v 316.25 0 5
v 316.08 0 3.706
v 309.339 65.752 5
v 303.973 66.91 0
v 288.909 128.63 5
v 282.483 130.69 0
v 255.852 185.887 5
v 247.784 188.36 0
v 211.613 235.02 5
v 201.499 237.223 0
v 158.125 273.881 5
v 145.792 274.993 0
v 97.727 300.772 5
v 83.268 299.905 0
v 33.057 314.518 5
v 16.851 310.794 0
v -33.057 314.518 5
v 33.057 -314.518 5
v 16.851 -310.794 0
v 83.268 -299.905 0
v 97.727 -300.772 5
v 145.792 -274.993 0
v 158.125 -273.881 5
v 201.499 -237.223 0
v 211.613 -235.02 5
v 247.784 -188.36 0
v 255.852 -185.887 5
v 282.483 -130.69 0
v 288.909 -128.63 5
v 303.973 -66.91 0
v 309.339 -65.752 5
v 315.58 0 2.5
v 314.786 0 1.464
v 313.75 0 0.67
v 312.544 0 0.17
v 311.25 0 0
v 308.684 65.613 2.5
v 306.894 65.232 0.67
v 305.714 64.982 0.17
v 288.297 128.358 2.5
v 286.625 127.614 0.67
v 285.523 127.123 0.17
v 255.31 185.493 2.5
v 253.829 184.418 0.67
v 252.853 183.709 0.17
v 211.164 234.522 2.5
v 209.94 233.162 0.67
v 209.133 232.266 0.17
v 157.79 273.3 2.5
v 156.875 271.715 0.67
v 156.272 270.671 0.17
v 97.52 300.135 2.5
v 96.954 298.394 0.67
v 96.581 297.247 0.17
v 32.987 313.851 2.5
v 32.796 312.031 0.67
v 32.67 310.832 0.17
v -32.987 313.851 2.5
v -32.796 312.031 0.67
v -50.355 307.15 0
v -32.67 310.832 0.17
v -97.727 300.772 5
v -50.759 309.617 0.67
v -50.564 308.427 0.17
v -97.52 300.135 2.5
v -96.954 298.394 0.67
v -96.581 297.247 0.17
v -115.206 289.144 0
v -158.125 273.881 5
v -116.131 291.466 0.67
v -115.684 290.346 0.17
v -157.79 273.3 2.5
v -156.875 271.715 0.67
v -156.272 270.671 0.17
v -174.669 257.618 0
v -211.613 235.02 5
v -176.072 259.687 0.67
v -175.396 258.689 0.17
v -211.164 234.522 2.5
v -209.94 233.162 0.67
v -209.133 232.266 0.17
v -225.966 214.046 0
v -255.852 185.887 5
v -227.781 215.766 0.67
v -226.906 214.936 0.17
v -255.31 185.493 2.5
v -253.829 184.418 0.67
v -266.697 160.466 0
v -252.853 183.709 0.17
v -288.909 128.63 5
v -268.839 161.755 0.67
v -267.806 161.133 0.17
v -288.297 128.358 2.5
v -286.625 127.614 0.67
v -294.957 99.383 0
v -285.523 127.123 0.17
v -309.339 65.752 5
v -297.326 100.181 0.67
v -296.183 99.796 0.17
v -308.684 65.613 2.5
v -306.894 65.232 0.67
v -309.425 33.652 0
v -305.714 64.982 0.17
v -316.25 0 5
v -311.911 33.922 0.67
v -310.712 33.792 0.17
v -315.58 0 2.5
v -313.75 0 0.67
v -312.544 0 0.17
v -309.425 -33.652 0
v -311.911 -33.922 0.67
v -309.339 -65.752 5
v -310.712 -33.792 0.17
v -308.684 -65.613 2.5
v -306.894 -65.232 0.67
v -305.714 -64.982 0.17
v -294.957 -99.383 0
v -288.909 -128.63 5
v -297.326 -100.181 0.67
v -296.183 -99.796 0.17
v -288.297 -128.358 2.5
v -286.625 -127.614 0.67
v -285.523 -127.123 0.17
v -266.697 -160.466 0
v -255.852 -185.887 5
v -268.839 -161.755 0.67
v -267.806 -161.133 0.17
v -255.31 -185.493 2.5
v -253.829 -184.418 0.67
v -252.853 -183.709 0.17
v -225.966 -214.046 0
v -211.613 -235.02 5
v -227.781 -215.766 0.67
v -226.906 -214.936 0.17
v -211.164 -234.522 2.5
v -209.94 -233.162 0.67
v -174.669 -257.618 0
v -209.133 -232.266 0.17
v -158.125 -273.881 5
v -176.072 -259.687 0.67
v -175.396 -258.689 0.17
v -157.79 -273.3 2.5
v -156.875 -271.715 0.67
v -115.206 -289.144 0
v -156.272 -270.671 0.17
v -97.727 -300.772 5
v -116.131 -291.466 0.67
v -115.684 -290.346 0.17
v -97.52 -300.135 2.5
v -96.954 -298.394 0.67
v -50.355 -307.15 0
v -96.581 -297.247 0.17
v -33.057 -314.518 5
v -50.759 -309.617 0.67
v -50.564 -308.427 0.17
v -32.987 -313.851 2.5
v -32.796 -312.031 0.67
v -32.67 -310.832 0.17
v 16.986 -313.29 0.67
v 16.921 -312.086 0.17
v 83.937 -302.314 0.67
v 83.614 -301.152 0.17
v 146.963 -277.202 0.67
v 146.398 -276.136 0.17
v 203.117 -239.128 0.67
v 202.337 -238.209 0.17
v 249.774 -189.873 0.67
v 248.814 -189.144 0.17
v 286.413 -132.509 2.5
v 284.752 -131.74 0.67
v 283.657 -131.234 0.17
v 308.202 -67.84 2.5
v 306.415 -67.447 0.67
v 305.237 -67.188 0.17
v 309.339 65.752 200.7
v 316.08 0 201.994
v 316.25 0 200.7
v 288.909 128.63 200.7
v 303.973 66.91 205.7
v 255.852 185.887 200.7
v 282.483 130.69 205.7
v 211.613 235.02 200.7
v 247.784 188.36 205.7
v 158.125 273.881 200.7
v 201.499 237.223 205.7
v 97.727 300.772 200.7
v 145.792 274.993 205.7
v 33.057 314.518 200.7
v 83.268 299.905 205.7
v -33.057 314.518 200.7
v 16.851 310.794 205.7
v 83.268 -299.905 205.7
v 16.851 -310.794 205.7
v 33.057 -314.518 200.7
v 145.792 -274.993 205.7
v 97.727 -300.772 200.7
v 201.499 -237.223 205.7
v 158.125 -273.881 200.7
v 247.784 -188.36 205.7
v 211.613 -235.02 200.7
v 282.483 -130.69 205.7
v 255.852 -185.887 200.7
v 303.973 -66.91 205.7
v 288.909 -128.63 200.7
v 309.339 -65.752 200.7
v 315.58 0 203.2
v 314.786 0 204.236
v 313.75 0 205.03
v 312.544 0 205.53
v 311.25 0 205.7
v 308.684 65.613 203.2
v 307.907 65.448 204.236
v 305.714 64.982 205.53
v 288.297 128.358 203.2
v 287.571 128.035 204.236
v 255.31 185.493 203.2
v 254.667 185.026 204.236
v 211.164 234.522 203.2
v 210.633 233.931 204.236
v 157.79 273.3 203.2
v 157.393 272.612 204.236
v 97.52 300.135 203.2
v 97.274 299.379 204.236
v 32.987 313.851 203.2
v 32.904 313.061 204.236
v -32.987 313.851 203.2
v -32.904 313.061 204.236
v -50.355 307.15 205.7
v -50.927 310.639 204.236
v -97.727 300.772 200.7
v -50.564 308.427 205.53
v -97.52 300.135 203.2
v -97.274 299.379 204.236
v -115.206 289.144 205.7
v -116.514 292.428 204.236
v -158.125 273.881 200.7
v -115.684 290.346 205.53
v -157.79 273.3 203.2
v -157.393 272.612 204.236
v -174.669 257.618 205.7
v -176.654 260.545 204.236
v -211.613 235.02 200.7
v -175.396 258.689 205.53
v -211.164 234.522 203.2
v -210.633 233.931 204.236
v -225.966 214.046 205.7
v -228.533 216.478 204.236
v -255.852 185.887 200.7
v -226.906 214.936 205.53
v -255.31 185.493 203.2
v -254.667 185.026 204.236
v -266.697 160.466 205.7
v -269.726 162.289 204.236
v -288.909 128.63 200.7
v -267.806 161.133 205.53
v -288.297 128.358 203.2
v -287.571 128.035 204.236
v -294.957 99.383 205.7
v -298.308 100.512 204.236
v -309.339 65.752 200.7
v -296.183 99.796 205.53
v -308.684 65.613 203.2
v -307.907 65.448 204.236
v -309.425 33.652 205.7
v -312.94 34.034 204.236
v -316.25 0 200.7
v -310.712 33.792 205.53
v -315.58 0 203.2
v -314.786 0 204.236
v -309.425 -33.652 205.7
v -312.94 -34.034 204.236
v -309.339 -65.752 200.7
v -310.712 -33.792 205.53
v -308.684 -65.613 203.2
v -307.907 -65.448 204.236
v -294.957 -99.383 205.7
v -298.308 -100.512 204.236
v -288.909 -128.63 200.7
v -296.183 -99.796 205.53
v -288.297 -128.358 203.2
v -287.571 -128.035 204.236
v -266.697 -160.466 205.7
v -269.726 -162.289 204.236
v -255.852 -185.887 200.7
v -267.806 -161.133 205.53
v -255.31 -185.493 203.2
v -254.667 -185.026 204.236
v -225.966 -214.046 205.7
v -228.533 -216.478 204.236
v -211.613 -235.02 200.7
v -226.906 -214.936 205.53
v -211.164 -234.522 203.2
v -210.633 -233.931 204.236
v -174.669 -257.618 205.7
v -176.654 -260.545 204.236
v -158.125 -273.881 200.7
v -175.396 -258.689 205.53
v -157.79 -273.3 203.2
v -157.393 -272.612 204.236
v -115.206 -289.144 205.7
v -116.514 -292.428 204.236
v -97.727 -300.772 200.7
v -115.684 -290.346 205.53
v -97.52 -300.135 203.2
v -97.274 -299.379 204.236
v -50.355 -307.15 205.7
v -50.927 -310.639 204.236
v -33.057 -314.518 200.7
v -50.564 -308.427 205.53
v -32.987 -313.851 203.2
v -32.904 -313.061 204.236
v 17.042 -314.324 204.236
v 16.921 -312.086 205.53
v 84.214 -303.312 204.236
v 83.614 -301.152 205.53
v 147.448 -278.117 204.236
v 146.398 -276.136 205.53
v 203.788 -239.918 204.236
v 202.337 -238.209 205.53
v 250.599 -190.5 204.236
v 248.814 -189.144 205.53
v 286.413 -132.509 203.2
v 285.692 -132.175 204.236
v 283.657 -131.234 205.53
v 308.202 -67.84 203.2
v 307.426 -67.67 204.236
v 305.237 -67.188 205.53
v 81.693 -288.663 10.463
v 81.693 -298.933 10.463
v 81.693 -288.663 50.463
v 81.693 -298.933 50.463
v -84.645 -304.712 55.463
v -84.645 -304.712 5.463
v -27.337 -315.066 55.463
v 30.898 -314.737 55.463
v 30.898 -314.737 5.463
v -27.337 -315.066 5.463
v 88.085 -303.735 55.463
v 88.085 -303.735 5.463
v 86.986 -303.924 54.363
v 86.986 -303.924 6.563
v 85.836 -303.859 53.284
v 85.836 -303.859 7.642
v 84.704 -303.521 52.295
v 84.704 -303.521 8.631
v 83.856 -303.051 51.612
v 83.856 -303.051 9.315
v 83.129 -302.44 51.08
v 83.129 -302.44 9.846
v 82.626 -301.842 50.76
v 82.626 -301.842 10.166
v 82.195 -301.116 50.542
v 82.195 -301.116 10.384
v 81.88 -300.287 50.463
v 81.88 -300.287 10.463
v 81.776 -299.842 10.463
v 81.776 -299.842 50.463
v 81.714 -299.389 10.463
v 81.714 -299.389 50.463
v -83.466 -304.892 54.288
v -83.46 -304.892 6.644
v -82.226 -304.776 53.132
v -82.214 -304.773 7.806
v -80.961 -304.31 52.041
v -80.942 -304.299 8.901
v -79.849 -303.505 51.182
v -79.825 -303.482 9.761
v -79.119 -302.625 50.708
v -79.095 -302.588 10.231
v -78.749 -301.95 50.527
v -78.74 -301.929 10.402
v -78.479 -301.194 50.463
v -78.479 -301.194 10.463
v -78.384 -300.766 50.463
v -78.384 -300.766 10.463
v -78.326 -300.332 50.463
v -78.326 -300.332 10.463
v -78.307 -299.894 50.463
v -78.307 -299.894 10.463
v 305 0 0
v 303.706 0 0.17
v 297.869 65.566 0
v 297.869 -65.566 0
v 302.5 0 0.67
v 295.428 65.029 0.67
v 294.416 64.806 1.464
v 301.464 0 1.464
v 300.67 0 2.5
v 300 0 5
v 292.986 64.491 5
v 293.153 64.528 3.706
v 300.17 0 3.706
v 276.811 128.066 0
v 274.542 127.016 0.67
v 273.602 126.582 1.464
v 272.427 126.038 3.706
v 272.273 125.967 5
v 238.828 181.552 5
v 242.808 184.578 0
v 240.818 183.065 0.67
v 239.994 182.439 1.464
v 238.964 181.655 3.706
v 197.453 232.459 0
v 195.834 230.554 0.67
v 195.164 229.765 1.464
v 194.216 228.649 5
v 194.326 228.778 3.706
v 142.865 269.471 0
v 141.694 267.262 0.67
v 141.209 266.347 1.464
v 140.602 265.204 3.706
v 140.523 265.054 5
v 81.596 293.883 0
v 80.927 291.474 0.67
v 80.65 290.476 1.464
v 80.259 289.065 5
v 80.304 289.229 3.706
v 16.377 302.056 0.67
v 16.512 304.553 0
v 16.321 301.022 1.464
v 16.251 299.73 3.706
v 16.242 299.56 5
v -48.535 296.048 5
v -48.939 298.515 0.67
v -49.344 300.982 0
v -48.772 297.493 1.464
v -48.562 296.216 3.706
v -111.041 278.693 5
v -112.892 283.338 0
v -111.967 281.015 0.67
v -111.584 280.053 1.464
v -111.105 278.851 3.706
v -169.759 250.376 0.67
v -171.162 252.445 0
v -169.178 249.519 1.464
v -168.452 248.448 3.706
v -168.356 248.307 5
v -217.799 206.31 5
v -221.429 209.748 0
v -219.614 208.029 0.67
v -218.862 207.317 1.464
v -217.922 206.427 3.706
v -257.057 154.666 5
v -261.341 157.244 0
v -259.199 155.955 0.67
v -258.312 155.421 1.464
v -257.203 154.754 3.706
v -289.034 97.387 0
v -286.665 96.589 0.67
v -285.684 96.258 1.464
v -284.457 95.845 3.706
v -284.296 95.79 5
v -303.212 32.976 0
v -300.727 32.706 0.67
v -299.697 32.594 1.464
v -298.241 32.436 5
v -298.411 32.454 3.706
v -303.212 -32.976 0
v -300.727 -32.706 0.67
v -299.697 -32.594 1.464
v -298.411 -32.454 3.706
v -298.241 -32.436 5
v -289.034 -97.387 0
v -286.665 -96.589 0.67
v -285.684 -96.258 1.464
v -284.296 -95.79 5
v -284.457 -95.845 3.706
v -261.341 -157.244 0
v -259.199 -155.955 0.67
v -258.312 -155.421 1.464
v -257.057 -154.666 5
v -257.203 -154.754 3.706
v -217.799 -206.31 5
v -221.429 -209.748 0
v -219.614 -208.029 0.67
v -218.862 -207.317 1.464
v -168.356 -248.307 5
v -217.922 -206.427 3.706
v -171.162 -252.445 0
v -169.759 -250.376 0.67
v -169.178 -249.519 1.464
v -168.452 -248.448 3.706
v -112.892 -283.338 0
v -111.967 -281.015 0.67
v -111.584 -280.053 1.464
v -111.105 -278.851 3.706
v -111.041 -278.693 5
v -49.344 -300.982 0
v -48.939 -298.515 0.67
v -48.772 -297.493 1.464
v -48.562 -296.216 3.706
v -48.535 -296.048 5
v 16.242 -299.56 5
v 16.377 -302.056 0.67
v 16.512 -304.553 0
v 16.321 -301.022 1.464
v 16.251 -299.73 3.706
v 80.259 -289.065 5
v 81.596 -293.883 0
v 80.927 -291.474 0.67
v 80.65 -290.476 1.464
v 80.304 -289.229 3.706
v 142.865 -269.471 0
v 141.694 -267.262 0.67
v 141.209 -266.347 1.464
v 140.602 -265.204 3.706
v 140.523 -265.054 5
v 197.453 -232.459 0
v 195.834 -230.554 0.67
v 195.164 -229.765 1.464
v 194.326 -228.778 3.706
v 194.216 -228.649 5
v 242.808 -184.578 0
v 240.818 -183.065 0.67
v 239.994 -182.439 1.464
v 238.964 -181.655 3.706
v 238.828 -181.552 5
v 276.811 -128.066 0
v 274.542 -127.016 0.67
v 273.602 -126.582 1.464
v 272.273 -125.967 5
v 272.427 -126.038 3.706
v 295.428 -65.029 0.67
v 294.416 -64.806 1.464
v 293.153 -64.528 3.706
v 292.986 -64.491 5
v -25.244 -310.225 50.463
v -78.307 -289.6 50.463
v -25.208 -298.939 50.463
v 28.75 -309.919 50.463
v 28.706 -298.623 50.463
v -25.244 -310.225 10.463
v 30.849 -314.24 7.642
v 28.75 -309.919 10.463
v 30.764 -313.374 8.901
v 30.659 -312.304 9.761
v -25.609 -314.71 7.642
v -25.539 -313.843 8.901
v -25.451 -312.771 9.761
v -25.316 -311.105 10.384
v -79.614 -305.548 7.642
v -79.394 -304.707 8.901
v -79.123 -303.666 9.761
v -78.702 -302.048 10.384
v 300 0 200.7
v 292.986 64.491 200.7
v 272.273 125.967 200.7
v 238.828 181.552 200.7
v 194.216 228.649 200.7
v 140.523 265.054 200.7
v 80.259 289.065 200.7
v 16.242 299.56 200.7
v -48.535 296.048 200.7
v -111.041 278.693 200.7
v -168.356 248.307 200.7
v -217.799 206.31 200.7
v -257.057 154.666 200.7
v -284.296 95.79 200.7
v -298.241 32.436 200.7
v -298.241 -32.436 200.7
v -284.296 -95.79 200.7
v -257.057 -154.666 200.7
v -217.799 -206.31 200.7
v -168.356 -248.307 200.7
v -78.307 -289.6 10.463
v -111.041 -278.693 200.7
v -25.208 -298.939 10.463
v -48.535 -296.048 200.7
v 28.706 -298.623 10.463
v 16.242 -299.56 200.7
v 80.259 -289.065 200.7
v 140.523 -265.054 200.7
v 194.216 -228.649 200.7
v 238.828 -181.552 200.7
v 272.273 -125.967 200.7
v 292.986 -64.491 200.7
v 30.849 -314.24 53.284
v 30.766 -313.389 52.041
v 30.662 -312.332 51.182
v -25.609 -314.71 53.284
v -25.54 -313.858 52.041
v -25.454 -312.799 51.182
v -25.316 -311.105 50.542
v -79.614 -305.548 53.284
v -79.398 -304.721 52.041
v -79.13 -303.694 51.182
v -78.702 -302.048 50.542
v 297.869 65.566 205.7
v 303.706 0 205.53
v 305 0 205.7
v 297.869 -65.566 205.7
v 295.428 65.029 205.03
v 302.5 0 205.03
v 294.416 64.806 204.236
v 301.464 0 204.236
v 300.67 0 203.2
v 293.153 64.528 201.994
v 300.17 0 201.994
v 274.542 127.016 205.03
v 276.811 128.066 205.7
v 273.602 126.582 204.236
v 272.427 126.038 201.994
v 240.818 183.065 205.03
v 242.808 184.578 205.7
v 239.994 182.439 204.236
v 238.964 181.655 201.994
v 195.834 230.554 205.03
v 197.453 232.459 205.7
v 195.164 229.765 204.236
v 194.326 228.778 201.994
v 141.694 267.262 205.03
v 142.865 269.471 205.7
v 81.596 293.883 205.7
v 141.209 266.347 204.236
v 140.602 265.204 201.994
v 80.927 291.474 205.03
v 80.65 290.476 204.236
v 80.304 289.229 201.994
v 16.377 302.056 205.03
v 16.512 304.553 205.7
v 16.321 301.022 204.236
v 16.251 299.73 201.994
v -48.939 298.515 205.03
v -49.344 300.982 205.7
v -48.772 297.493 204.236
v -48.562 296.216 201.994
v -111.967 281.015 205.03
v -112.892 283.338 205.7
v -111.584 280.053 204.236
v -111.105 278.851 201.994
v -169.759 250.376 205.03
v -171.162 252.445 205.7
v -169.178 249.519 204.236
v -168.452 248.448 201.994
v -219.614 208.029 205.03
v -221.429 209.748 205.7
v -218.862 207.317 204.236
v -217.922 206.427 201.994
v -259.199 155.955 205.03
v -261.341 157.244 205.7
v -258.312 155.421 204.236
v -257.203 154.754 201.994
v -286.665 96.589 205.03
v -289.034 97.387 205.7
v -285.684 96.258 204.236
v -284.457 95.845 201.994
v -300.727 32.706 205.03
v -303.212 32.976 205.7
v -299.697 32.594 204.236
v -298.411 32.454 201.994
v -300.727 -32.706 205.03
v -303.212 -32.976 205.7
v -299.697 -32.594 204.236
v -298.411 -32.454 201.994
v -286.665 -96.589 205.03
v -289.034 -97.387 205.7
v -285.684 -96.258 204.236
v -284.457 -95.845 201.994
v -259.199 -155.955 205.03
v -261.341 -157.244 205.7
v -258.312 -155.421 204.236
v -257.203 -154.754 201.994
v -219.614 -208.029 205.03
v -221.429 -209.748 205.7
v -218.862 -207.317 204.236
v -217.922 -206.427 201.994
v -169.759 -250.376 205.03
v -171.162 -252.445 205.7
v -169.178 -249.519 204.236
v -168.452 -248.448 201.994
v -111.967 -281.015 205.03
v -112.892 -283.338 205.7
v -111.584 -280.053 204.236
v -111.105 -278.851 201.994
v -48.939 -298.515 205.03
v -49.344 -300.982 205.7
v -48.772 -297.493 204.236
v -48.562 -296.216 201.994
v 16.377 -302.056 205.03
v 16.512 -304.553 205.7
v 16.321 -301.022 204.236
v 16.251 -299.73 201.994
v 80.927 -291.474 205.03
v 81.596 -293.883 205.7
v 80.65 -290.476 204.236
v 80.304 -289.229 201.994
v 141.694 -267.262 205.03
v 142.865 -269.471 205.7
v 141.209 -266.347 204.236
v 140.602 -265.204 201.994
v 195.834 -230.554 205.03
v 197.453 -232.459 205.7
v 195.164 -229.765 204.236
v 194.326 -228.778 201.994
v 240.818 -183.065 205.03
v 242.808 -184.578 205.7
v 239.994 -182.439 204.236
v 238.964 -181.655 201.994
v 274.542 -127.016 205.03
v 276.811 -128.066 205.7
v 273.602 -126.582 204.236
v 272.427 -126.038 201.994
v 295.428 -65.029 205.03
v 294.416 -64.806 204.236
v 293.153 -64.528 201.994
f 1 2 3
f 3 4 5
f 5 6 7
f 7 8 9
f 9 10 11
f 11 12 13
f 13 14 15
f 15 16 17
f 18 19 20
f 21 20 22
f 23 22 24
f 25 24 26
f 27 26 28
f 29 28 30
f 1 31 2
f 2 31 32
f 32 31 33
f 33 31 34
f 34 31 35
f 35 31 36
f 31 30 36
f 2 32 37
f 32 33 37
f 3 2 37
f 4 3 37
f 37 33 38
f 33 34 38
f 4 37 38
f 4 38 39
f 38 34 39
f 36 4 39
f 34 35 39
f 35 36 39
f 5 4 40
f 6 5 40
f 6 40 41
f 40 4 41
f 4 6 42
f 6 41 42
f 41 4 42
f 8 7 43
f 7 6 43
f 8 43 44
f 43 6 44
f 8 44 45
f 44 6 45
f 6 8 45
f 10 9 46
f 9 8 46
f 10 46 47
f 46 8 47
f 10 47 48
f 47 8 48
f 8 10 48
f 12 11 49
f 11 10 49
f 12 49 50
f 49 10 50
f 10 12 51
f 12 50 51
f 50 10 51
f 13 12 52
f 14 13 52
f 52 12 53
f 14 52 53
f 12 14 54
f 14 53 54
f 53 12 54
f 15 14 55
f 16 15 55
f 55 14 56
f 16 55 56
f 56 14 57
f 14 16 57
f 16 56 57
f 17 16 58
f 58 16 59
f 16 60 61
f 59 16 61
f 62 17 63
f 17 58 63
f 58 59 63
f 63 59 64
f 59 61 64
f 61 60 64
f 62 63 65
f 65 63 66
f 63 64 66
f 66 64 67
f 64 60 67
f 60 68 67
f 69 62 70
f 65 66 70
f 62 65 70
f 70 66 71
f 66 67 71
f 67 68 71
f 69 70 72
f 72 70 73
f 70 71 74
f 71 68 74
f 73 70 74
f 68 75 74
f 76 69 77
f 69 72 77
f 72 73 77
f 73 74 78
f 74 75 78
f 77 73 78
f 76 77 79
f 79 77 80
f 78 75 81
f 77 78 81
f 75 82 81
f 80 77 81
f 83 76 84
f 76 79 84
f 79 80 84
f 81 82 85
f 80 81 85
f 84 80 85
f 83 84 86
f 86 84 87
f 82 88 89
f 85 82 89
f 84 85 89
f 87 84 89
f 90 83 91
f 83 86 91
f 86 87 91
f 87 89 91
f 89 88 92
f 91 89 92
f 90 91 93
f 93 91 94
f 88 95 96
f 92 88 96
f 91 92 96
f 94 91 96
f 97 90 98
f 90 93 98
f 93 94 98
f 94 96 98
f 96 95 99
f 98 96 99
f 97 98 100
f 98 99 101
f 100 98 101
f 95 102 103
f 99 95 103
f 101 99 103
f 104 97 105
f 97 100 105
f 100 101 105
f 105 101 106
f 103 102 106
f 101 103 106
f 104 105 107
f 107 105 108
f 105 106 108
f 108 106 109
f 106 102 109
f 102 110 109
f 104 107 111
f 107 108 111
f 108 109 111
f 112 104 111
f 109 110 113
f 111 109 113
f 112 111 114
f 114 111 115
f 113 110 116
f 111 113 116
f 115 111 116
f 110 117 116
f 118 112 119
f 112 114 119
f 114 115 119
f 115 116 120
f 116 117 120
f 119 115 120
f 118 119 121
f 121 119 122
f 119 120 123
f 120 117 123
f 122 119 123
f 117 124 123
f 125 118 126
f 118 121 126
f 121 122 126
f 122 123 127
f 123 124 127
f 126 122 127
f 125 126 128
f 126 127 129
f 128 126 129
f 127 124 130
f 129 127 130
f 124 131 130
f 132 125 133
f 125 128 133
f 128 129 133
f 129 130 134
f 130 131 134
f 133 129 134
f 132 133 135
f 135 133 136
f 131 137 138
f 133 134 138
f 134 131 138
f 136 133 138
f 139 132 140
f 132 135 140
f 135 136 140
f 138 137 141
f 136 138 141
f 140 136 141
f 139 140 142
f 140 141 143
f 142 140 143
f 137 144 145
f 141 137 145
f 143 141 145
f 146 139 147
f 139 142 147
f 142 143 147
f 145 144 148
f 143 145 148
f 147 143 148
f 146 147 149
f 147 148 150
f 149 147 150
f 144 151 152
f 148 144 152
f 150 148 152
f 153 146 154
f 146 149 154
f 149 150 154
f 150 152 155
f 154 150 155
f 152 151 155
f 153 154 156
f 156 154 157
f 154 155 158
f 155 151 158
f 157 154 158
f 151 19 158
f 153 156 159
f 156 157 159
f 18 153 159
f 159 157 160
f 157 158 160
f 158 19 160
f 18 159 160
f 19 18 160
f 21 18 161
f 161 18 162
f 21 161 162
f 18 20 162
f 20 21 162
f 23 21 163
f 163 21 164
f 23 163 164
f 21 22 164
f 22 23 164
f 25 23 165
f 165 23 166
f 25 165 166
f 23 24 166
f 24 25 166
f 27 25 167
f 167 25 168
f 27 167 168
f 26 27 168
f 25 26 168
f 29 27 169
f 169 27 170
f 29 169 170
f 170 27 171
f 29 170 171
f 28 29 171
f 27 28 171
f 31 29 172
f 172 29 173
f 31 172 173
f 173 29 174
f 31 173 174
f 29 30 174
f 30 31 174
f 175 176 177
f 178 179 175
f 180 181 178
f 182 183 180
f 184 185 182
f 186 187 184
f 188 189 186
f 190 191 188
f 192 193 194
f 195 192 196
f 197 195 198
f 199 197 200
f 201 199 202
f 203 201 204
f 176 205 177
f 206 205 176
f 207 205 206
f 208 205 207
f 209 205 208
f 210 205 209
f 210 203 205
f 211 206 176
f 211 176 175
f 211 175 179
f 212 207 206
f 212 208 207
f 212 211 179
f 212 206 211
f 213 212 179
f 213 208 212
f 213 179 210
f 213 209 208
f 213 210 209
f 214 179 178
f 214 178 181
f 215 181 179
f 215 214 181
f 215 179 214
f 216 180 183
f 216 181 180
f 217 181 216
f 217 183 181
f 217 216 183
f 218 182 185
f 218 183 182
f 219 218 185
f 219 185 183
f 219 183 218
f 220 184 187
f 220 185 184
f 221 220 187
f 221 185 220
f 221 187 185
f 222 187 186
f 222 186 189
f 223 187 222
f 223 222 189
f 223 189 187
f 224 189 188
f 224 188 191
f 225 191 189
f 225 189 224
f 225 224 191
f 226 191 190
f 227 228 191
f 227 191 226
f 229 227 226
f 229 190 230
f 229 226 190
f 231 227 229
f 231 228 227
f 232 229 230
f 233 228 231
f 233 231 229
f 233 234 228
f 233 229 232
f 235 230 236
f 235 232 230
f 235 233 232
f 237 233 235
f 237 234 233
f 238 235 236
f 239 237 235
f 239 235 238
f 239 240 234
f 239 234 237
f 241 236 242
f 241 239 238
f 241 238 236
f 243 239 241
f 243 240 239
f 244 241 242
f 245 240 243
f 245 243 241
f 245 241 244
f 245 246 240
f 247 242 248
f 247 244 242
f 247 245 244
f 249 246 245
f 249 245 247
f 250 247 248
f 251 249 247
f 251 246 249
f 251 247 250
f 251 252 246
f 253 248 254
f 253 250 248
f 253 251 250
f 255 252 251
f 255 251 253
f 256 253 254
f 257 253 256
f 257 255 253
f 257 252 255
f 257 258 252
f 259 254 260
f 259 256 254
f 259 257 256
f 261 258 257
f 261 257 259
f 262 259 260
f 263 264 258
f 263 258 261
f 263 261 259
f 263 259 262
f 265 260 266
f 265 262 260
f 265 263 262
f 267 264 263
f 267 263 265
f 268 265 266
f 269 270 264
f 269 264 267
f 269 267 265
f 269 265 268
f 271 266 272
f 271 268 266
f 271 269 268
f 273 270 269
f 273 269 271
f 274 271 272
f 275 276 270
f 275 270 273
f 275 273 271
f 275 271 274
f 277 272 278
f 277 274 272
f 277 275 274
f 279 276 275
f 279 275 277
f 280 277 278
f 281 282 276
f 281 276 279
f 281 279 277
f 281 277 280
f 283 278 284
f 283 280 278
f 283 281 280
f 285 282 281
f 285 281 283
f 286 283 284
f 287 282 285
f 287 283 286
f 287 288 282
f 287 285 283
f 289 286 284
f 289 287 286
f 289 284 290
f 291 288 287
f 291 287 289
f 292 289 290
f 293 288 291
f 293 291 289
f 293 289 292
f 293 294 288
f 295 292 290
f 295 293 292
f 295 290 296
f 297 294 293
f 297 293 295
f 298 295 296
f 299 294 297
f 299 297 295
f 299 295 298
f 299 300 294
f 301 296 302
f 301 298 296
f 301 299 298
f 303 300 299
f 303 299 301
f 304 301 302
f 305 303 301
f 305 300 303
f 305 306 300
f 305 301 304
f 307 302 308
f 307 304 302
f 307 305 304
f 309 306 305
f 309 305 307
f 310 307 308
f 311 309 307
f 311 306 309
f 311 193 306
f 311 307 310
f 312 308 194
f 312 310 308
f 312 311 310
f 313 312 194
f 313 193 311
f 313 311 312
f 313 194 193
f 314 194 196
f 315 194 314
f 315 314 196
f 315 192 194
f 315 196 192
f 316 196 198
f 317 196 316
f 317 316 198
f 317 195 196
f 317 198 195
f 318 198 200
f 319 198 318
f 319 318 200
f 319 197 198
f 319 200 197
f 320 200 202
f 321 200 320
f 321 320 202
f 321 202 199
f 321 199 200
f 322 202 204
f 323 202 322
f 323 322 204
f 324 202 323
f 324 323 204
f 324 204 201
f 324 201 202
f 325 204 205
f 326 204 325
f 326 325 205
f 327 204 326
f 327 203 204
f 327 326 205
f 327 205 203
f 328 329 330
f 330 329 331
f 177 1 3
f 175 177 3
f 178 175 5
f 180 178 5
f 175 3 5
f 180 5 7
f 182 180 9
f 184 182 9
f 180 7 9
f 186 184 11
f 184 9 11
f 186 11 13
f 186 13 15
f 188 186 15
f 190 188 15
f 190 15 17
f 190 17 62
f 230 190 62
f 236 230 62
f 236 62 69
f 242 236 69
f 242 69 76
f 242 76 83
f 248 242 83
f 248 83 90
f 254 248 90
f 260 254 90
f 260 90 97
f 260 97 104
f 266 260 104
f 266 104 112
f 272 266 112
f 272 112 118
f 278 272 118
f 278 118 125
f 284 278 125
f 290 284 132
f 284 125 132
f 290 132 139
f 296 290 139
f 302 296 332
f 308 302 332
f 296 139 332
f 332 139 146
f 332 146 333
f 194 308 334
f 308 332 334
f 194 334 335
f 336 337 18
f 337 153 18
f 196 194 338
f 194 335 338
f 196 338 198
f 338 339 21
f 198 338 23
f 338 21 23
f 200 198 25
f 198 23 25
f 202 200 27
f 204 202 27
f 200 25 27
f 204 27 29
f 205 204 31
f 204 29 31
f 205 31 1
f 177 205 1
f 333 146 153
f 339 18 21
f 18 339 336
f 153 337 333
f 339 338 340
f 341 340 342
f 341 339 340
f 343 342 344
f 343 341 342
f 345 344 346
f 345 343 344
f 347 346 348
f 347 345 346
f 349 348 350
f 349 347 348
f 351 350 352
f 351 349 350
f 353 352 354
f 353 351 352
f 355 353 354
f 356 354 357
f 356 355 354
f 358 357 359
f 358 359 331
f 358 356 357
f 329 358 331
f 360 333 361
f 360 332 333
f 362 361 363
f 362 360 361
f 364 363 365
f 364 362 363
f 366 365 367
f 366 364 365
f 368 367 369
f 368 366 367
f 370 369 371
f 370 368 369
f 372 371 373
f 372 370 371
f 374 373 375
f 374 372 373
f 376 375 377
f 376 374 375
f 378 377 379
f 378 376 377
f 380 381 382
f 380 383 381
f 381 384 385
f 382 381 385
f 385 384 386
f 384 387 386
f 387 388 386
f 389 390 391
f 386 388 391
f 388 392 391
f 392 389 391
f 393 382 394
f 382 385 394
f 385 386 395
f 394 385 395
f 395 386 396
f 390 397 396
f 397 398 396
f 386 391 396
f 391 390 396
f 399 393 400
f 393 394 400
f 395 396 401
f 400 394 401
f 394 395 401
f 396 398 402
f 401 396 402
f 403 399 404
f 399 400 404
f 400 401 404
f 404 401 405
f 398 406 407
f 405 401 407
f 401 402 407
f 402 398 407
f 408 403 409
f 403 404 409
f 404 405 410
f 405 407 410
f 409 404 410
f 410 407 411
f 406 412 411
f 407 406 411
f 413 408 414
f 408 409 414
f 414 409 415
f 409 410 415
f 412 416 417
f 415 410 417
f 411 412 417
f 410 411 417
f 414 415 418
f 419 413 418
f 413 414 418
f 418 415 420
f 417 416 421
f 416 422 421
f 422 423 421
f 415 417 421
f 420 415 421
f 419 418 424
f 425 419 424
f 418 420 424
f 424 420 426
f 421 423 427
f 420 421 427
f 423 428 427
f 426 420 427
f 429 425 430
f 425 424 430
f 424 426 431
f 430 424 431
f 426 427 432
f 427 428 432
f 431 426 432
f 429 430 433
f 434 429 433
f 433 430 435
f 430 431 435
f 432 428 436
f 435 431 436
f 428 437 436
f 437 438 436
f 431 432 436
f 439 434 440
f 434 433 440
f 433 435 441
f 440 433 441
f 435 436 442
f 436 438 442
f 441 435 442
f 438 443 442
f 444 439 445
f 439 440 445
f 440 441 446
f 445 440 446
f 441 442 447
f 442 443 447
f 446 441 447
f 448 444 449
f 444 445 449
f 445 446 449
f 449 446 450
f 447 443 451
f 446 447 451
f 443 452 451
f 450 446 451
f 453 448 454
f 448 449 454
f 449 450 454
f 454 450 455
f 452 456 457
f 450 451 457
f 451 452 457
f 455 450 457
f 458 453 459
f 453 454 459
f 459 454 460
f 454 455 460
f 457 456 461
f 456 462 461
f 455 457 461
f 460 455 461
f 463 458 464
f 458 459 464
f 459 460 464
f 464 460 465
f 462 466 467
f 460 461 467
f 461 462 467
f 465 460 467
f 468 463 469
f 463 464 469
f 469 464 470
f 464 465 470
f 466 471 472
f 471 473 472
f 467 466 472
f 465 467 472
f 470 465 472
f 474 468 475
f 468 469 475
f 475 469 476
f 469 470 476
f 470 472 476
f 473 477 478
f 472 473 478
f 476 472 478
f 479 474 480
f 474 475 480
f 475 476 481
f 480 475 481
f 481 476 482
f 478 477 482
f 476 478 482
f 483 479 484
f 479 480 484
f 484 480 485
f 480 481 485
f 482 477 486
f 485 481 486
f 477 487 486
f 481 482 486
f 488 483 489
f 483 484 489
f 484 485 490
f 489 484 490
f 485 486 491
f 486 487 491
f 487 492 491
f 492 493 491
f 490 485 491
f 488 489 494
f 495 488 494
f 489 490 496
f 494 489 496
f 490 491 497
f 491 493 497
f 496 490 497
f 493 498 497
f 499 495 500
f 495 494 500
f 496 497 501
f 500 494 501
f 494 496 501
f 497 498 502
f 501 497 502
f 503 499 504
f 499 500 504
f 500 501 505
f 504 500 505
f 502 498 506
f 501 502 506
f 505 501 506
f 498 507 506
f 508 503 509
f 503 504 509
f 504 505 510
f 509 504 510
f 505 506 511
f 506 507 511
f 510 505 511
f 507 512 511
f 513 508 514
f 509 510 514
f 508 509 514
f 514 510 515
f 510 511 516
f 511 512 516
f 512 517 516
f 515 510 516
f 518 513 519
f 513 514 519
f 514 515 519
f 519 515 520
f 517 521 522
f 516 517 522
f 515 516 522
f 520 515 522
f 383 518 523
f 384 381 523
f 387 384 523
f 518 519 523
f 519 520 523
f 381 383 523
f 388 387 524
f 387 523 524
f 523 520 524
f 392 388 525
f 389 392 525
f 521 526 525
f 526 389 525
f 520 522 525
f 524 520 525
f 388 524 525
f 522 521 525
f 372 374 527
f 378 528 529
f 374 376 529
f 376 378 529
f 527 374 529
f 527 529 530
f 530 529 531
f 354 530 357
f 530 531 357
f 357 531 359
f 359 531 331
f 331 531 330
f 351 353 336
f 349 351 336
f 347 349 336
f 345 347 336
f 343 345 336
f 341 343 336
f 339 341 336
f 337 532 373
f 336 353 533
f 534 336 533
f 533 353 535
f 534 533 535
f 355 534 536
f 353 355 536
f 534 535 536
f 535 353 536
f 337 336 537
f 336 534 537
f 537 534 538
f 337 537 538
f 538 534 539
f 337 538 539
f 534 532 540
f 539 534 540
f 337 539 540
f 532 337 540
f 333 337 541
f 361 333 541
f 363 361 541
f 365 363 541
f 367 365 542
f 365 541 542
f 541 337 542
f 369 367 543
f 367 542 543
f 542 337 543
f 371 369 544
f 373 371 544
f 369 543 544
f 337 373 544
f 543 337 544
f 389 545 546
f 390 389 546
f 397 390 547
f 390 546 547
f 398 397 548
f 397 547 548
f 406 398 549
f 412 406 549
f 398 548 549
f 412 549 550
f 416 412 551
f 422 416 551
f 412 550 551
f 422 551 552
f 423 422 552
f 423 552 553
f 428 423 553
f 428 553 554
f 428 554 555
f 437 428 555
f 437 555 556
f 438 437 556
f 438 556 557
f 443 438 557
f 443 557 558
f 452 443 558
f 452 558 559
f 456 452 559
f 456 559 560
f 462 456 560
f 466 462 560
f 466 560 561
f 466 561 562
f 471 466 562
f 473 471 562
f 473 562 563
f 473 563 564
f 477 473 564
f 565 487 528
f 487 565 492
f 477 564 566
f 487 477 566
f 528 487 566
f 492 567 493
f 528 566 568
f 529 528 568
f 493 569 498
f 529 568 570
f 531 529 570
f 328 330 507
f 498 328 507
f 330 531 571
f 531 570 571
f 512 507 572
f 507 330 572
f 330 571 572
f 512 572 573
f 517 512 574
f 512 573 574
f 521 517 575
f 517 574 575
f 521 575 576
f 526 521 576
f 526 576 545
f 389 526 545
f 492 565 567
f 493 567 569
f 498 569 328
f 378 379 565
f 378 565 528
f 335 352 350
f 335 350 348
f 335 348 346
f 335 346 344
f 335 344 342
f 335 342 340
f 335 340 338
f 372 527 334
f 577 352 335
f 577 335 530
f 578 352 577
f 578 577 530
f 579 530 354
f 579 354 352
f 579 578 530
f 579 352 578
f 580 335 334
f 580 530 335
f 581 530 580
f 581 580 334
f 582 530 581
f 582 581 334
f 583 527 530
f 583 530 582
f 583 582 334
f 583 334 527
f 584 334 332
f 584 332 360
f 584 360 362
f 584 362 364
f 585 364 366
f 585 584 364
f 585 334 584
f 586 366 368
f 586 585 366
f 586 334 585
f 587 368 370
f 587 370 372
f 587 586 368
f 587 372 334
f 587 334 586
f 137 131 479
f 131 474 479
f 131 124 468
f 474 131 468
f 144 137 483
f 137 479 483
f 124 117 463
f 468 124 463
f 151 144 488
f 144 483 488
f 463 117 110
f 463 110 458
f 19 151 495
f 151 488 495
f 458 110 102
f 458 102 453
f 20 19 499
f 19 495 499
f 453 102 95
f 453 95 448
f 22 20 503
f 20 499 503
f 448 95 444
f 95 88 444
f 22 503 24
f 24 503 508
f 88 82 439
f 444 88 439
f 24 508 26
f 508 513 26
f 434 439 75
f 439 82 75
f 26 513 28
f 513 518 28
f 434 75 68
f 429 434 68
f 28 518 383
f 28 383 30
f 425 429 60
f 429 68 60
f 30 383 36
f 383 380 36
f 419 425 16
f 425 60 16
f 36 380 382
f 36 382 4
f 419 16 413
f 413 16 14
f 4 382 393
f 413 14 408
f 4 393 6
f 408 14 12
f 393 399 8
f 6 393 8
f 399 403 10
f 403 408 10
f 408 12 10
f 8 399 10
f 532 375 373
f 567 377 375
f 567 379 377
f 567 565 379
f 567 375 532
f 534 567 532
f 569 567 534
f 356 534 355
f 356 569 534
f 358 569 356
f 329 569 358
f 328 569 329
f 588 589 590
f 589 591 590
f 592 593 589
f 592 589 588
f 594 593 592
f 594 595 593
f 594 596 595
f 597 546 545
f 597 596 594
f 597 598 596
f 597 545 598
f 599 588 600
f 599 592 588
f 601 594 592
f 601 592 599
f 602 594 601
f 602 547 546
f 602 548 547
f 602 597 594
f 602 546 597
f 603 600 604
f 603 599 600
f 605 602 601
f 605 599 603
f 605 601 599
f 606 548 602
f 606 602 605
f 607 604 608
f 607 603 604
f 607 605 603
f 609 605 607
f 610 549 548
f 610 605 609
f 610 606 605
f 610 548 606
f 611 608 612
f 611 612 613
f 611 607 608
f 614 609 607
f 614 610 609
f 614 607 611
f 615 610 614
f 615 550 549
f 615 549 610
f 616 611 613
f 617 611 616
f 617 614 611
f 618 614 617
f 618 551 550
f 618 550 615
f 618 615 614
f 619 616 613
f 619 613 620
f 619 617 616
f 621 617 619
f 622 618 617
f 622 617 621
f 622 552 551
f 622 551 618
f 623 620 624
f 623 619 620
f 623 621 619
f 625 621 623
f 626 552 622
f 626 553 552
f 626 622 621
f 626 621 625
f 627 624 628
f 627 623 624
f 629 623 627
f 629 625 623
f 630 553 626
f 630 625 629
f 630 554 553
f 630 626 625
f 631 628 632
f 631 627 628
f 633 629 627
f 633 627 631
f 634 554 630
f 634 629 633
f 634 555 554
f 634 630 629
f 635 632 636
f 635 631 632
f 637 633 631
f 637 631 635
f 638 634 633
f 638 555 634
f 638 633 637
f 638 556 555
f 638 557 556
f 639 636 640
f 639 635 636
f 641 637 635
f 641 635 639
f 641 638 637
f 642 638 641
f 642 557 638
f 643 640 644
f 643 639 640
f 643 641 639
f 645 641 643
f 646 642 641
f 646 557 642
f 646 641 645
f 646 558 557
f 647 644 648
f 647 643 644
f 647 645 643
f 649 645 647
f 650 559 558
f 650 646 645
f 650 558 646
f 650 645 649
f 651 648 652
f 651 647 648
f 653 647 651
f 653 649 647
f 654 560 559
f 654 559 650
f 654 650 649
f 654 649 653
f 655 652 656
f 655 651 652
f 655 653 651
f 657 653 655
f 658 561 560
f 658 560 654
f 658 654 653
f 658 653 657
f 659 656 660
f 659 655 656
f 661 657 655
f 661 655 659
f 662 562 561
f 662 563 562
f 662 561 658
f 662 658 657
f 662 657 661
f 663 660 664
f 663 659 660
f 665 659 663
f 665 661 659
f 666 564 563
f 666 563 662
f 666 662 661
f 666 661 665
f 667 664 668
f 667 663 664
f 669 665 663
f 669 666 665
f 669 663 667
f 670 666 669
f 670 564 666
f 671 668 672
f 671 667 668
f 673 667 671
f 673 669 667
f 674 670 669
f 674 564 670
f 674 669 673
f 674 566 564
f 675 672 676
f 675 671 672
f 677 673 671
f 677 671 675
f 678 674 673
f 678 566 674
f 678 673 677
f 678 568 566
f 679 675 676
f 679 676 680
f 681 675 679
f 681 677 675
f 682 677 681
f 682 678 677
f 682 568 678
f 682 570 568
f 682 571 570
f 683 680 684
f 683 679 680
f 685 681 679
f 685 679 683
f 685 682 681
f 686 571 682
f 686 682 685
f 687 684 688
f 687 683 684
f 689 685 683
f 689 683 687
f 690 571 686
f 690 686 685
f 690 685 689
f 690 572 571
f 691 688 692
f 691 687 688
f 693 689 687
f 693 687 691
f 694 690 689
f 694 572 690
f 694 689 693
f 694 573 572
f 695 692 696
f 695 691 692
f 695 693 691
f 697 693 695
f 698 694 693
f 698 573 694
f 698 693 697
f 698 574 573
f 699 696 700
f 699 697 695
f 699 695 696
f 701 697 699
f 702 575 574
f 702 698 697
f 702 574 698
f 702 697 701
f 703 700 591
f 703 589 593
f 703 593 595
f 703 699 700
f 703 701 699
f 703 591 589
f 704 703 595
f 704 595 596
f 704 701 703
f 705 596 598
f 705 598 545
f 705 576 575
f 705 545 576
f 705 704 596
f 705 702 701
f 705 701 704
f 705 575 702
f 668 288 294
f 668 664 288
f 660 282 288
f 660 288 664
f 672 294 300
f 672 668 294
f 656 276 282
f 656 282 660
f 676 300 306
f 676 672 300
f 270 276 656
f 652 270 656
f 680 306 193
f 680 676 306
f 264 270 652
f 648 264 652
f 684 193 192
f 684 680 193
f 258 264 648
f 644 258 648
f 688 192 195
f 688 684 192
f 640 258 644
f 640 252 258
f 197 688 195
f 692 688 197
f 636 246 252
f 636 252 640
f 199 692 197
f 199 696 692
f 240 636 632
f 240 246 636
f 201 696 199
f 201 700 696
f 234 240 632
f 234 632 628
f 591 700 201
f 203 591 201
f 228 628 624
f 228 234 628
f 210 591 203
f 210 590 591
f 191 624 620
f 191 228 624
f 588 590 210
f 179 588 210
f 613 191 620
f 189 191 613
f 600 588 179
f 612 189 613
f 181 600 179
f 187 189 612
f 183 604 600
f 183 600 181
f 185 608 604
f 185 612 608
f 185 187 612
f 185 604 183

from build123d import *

# Parameters (mm, degrees)
F0_R         = 316.25
F1_DEPTH     = 205.7
F2_R         = 300
F3_DEPTH     = 631
F5_W         = 160
F5_H         = 40
F6_DEPTH     = 796.1248755455
F7_T1_DEPTH  = 40
F7_T10_ANGLE = 33.8359646931
F7_T16_ANGLE = 33.8359646931
F7_T27_ANGLE = 33.8359646931
F7_T31_DEPTH = 56.5905669687
F7_T38_DEPTH = 56.399324286
F7_T42_ANGLE = 33.8359646931
F7_T49_ANGLE = 33.8359646931
F7_T53_DEPTH = 56.5905669687
F7_T60_ANGLE = 33.8359646931
F7_T64_DEPTH = 56.399324286


# Not quite as in the source:
# - a fillet or chamfer that OpenCascade refuses, or shapes differently, is made with other operations: its cross-section is extruded or revolved along the edge and cut away or added


with BuildPart() as f1:
    # F0 (on Top) → F1 (new body)
    with BuildSketch(Plane.XY):
        Circle(F0_R)
    extrude(amount=F1_DEPTH)

    # F2 (on face) → F3 (cut)
    with BuildSketch(Plane.XY.offset(205.7)):
        Circle(F2_R)
    extrude(amount=-F3_DEPTH, mode=Mode.SUBTRACT)

    # F5 (on offset) → F6 (cut)
    with BuildSketch(Plane.XZ.offset(645.5422639847)):
        with Locations((1.6928017139, 30.4630875368)):
            Rectangle(F5_W, F5_H)
    extrude(amount=-F6_DEPTH, mode=Mode.SUBTRACT)

    # F7: fillet of radius 5 on 8 edges, made by hand

    # F7_s2 → F7_t1 (cut)
    with BuildSketch(Plane.XY.offset(10.4630875368)):
        with BuildLine():
            ThreePointArc((88.0854571632, -303.7351061968), (83.6897430437, -302.9306742994), (81.6928017139, -298.9329701304))
            Line((81.6928017139, -298.9329701304), (81.6928017139, -305.5165276186))
            ThreePointArc((81.6928017139, -305.5165276186), (84.8938022614, -304.6425853974), (88.0854571632, -303.7351061968))
        make_face()
        with BuildLine():
            ThreePointArc((-84.6454665316, -304.7116792899), (-80.2815860528, -303.8747654151), (-78.3071982861, -299.8941033327))
            Line((-78.3071982861, -299.8941033327), (-78.3071982861, -306.401770877))
            ThreePointArc((-78.3071982861, -306.401770877), (-81.4807145599, -305.5731592513), (-84.6454665316, -304.7116792899))
        make_face()
    extrude(amount=F7_T1_DEPTH, mode=Mode.SUBTRACT)

    # F7_s3 → F7_t4 (revolve, cut)
    with BuildSketch(Plane.XZ):
        with BuildLine():
            ThreePointArc((316.25, 200.7), (314.7855339059, 204.2355339059), (311.25, 205.7))
            Line((311.25, 205.7), (316.25, 205.7))
            Line((316.25, 205.7), (316.25, 200.7))
        make_face()
    revolve(axis=Axis((0, 0, 205.7), (0, 0, 1)), mode=Mode.SUBTRACT)

    # F7_s5 → F7_t6 (revolve, cut)
    with BuildSketch(Plane.XZ):
        with BuildLine():
            ThreePointArc((305, 205.7), (301.4644660941, 204.2355339059), (300, 200.7))
            Line((300, 200.7), (300, 205.7))
            Line((300, 205.7), (305, 205.7))
        make_face()
    revolve(axis=Axis((0, 0, 205.7), (0, 0, 1)), mode=Mode.SUBTRACT)


with BuildPart() as f7_tool8:
    # F7_s9 → F7_t10 (revolve)
    with BuildSketch(Plane(origin=(0, 0, 0), x_dir=(0, 0, 1), z_dir=(0.9550976314, 0.2962912662, 0))):
        with BuildLine():
            ThreePointArc((55.4630875368, 316.25), (51.9275536309, 314.7855339059), (50.4630875368, 311.25))
            Line((50.4630875368, 311.25), (50.4630875368, 316.25))
            Line((50.4630875368, 316.25), (55.4630875368, 316.25))
        make_face()
    revolve(axis=Axis((0, 0, 50.4630875368), (0, 0, -1)), revolution_arc=F7_T10_ANGLE)

    split(bisect_by=Plane.YZ.offset(-78.3071982861), keep=Keep.TOP)

    split(bisect_by=Plane.YZ.offset(81.6928017139), keep=Keep.BOTTOM)


with BuildPart() as f1_1:
    add(f1.part)

    # F7_t7: cut F7_tool8
    add(f7_tool8.part, mode=Mode.SUBTRACT)


with BuildPart() as f7_tool14:
    # F7_s15 → F7_t16 (revolve)
    with BuildSketch(Plane(origin=(0, 0, 0), x_dir=(0, 0, 1), z_dir=(0.9550976314, 0.2962912662, 0))):
        with BuildLine():
            ThreePointArc((5.4630875368, 316.25), (8.9986214427, 314.7855339059), (10.4630875368, 311.25))
            Line((10.4630875368, 311.25), (10.4630875368, 316.25))
            Line((10.4630875368, 316.25), (5.4630875368, 316.25))
        make_face()
    revolve(axis=Axis((0, 0, 10.4630875368), (0, 0, -1)), revolution_arc=F7_T16_ANGLE)

    split(bisect_by=Plane.YZ.offset(81.6928017139), keep=Keep.BOTTOM)

    split(bisect_by=Plane.YZ.offset(-78.3071982861), keep=Keep.TOP)


with BuildPart() as f1_2:
    add(f1_1.part)

    # F7_t13: cut F7_tool14
    add(f7_tool14.part, mode=Mode.SUBTRACT)

    # F7_s19 → F7_t20 (revolve, cut)
    with BuildSketch(Plane.XZ):
        with BuildLine():
            ThreePointArc((316.25, 5), (314.7855339059, 1.4644660941), (311.25, 0))
            Line((311.25, 0), (316.25, 0))
            Line((316.25, 0), (316.25, 5))
        make_face()
    revolve(axis=Axis((0, 0, 0), (0, 0, 1)), mode=Mode.SUBTRACT)

    # F7_s21 → F7_t22 (revolve, cut)
    with BuildSketch(Plane.XZ):
        with BuildLine():
            ThreePointArc((305, 0), (301.4644660941, 1.4644660941), (300, 5))
            Line((300, 5), (300, 0))
            Line((300, 0), (305, 0))
        make_face()
    revolve(axis=Axis((0, 0, 0), (0, 0, 1)), mode=Mode.SUBTRACT)


with BuildPart() as f7_tool25:
    # F7_s26 → F7_t27 (revolve)
    with BuildSketch(Plane(origin=(0, 0, 0), x_dir=(0, 0, 1), z_dir=(0.9550976314, 0.2962912662, 0))):
        with BuildLine():
            ThreePointArc((55.4630875368, 316.25), (51.9275536309, 314.7855339059), (50.4630875368, 311.25))
            Line((50.4630875368, 311.25), (50.4630875368, 316.25))
            Line((50.4630875368, 316.25), (55.4630875368, 316.25))
        make_face()
    revolve(axis=Axis((0, 0, 50.4630875368), (0, 0, -1)), revolution_arc=F7_T27_ANGLE)

    split(bisect_by=Plane.YZ.offset(81.6928017139), keep=Keep.TOP)


with BuildPart() as f7_tool29:
    # F7_s30 → F7_t31 (new body)
    with BuildSketch(Plane.XY.offset(67.0536545055)):
        with BuildLine():
            ThreePointArc((88.0854571632, -303.7351061968), (83.6897430437, -302.9306742994), (81.6928017139, -298.9329701304))
            Line((81.6928017139, -298.9329701304), (81.6928017139, -305.5165276186))
            ThreePointArc((81.6928017139, -305.5165276186), (84.8938022614, -304.6425853974), (88.0854571632, -303.7351061968))
        make_face()
    extrude(amount=-F7_T31_DEPTH)

    split(bisect_by=Plane.XY.offset(50.4630875368), keep=Keep.TOP)


with BuildPart() as f7_tool25_1:
    add(f7_tool25.part)

    # F7_t33: intersect F7_tool29
    add(f7_tool29.part, mode=Mode.INTERSECT)


with BuildPart() as f1_3:
    add(f1_2.part)

    # F7_t23: cut F7_tool25
    add(f7_tool25_1.part, mode=Mode.SUBTRACT)


with BuildPart() as f7_tool36:
    # F7_s37 → F7_t38 (new body)
    with BuildSketch(Plane.XY.offset(66.8624118228)):
        with BuildLine():
            ThreePointArc((-84.6454665316, -304.7116792899), (-80.2815860528, -303.8747654151), (-78.3071982861, -299.8941033327))
            Line((-78.3071982861, -299.8941033327), (-78.3071982861, -306.401770877))
            ThreePointArc((-78.3071982861, -306.401770877), (-81.4807145599, -305.5731592513), (-84.6454665316, -304.7116792899))
        make_face()
    extrude(amount=-F7_T38_DEPTH)

    split(bisect_by=Plane.XY.offset(50.4630875368), keep=Keep.TOP)


with BuildPart() as f7_tool40:
    # F7_s41 → F7_t42 (revolve)
    with BuildSketch(Plane(origin=(0, 0, 0), x_dir=(0, 0, 1), z_dir=(0.9550976314, 0.2962912662, 0))):
        with BuildLine():
            ThreePointArc((55.4630875368, 316.25), (51.9275536309, 314.7855339059), (50.4630875368, 311.25))
            Line((50.4630875368, 311.25), (50.4630875368, 316.25))
            Line((50.4630875368, 316.25), (55.4630875368, 316.25))
        make_face()
    revolve(axis=Axis((0, 0, 50.4630875368), (0, 0, -1)), revolution_arc=F7_T42_ANGLE)

    split(bisect_by=Plane.YZ.offset(-78.3071982861), keep=Keep.BOTTOM)


with BuildPart() as f7_tool36_1:
    add(f7_tool36.part)

    # F7_t44: intersect F7_tool40
    add(f7_tool40.part, mode=Mode.INTERSECT)


with BuildPart() as f1_4:
    add(f1_3.part)

    # F7_t34: cut F7_tool36
    add(f7_tool36_1.part, mode=Mode.SUBTRACT)


with BuildPart() as f7_tool47:
    # F7_s48 → F7_t49 (revolve)
    with BuildSketch(Plane(origin=(0, 0, 0), x_dir=(0, 0, 1), z_dir=(0.9550976314, 0.2962912662, 0))):
        with BuildLine():
            ThreePointArc((5.4630875368, 316.25), (8.9986214427, 314.7855339059), (10.4630875368, 311.25))
            Line((10.4630875368, 311.25), (10.4630875368, 316.25))
            Line((10.4630875368, 316.25), (5.4630875368, 316.25))
        make_face()
    revolve(axis=Axis((0, 0, 10.4630875368), (0, 0, -1)), revolution_arc=F7_T49_ANGLE)

    split(bisect_by=Plane.YZ.offset(81.6928017139), keep=Keep.TOP)


with BuildPart() as f7_tool51:
    # F7_s52 → F7_t53 (new body)
    with BuildSketch(Plane.XY.offset(50.4630875368)):
        with BuildLine():
            ThreePointArc((88.0854571632, -303.7351061968), (83.6897430437, -302.9306742994), (81.6928017139, -298.9329701304))
            Line((81.6928017139, -298.9329701304), (81.6928017139, -305.5165276186))
            ThreePointArc((81.6928017139, -305.5165276186), (84.8938022614, -304.6425853974), (88.0854571632, -303.7351061968))
        make_face()
    extrude(amount=-F7_T53_DEPTH)

    split(bisect_by=Plane.XY.offset(10.4630875368), keep=Keep.BOTTOM)


with BuildPart() as f7_tool47_1:
    add(f7_tool47.part)

    # F7_t55: intersect F7_tool51
    add(f7_tool51.part, mode=Mode.INTERSECT)


with BuildPart() as f1_5:
    add(f1_4.part)

    # F7_t45: cut F7_tool47
    add(f7_tool47_1.part, mode=Mode.SUBTRACT)


with BuildPart() as f7_tool58:
    # F7_s59 → F7_t60 (revolve)
    with BuildSketch(Plane(origin=(0, 0, 0), x_dir=(0, 0, 1), z_dir=(0.9550976314, 0.2962912662, 0))):
        with BuildLine():
            ThreePointArc((5.4630875368, 316.25), (8.9986214427, 314.7855339059), (10.4630875368, 311.25))
            Line((10.4630875368, 311.25), (10.4630875368, 316.25))
            Line((10.4630875368, 316.25), (5.4630875368, 316.25))
        make_face()
    revolve(axis=Axis((0, 0, 10.4630875368), (0, 0, -1)), revolution_arc=F7_T60_ANGLE)

    split(bisect_by=Plane.YZ.offset(-78.3071982861), keep=Keep.BOTTOM)


with BuildPart() as f7_tool62:
    # F7_s63 → F7_t64 (new body)
    with BuildSketch(Plane.XY.offset(50.4630875368)):
        with BuildLine():
            ThreePointArc((-84.6454665316, -304.7116792899), (-80.2815860528, -303.8747654151), (-78.3071982861, -299.8941033327))
            Line((-78.3071982861, -299.8941033327), (-78.3071982861, -306.401770877))
            ThreePointArc((-78.3071982861, -306.401770877), (-81.4807145599, -305.5731592513), (-84.6454665316, -304.7116792899))
        make_face()
    extrude(amount=-F7_T64_DEPTH)

    split(bisect_by=Plane.XY.offset(10.4630875368), keep=Keep.BOTTOM)


with BuildPart() as f7_tool58_1:
    add(f7_tool58.part)

    # F7_t66: intersect F7_tool62
    add(f7_tool62.part, mode=Mode.INTERSECT)


with BuildPart() as f1_6:
    add(f1_5.part)

    # F7_t56: cut F7_tool58
    add(f7_tool58_1.part, mode=Mode.SUBTRACT)


solid = f1_6.part
